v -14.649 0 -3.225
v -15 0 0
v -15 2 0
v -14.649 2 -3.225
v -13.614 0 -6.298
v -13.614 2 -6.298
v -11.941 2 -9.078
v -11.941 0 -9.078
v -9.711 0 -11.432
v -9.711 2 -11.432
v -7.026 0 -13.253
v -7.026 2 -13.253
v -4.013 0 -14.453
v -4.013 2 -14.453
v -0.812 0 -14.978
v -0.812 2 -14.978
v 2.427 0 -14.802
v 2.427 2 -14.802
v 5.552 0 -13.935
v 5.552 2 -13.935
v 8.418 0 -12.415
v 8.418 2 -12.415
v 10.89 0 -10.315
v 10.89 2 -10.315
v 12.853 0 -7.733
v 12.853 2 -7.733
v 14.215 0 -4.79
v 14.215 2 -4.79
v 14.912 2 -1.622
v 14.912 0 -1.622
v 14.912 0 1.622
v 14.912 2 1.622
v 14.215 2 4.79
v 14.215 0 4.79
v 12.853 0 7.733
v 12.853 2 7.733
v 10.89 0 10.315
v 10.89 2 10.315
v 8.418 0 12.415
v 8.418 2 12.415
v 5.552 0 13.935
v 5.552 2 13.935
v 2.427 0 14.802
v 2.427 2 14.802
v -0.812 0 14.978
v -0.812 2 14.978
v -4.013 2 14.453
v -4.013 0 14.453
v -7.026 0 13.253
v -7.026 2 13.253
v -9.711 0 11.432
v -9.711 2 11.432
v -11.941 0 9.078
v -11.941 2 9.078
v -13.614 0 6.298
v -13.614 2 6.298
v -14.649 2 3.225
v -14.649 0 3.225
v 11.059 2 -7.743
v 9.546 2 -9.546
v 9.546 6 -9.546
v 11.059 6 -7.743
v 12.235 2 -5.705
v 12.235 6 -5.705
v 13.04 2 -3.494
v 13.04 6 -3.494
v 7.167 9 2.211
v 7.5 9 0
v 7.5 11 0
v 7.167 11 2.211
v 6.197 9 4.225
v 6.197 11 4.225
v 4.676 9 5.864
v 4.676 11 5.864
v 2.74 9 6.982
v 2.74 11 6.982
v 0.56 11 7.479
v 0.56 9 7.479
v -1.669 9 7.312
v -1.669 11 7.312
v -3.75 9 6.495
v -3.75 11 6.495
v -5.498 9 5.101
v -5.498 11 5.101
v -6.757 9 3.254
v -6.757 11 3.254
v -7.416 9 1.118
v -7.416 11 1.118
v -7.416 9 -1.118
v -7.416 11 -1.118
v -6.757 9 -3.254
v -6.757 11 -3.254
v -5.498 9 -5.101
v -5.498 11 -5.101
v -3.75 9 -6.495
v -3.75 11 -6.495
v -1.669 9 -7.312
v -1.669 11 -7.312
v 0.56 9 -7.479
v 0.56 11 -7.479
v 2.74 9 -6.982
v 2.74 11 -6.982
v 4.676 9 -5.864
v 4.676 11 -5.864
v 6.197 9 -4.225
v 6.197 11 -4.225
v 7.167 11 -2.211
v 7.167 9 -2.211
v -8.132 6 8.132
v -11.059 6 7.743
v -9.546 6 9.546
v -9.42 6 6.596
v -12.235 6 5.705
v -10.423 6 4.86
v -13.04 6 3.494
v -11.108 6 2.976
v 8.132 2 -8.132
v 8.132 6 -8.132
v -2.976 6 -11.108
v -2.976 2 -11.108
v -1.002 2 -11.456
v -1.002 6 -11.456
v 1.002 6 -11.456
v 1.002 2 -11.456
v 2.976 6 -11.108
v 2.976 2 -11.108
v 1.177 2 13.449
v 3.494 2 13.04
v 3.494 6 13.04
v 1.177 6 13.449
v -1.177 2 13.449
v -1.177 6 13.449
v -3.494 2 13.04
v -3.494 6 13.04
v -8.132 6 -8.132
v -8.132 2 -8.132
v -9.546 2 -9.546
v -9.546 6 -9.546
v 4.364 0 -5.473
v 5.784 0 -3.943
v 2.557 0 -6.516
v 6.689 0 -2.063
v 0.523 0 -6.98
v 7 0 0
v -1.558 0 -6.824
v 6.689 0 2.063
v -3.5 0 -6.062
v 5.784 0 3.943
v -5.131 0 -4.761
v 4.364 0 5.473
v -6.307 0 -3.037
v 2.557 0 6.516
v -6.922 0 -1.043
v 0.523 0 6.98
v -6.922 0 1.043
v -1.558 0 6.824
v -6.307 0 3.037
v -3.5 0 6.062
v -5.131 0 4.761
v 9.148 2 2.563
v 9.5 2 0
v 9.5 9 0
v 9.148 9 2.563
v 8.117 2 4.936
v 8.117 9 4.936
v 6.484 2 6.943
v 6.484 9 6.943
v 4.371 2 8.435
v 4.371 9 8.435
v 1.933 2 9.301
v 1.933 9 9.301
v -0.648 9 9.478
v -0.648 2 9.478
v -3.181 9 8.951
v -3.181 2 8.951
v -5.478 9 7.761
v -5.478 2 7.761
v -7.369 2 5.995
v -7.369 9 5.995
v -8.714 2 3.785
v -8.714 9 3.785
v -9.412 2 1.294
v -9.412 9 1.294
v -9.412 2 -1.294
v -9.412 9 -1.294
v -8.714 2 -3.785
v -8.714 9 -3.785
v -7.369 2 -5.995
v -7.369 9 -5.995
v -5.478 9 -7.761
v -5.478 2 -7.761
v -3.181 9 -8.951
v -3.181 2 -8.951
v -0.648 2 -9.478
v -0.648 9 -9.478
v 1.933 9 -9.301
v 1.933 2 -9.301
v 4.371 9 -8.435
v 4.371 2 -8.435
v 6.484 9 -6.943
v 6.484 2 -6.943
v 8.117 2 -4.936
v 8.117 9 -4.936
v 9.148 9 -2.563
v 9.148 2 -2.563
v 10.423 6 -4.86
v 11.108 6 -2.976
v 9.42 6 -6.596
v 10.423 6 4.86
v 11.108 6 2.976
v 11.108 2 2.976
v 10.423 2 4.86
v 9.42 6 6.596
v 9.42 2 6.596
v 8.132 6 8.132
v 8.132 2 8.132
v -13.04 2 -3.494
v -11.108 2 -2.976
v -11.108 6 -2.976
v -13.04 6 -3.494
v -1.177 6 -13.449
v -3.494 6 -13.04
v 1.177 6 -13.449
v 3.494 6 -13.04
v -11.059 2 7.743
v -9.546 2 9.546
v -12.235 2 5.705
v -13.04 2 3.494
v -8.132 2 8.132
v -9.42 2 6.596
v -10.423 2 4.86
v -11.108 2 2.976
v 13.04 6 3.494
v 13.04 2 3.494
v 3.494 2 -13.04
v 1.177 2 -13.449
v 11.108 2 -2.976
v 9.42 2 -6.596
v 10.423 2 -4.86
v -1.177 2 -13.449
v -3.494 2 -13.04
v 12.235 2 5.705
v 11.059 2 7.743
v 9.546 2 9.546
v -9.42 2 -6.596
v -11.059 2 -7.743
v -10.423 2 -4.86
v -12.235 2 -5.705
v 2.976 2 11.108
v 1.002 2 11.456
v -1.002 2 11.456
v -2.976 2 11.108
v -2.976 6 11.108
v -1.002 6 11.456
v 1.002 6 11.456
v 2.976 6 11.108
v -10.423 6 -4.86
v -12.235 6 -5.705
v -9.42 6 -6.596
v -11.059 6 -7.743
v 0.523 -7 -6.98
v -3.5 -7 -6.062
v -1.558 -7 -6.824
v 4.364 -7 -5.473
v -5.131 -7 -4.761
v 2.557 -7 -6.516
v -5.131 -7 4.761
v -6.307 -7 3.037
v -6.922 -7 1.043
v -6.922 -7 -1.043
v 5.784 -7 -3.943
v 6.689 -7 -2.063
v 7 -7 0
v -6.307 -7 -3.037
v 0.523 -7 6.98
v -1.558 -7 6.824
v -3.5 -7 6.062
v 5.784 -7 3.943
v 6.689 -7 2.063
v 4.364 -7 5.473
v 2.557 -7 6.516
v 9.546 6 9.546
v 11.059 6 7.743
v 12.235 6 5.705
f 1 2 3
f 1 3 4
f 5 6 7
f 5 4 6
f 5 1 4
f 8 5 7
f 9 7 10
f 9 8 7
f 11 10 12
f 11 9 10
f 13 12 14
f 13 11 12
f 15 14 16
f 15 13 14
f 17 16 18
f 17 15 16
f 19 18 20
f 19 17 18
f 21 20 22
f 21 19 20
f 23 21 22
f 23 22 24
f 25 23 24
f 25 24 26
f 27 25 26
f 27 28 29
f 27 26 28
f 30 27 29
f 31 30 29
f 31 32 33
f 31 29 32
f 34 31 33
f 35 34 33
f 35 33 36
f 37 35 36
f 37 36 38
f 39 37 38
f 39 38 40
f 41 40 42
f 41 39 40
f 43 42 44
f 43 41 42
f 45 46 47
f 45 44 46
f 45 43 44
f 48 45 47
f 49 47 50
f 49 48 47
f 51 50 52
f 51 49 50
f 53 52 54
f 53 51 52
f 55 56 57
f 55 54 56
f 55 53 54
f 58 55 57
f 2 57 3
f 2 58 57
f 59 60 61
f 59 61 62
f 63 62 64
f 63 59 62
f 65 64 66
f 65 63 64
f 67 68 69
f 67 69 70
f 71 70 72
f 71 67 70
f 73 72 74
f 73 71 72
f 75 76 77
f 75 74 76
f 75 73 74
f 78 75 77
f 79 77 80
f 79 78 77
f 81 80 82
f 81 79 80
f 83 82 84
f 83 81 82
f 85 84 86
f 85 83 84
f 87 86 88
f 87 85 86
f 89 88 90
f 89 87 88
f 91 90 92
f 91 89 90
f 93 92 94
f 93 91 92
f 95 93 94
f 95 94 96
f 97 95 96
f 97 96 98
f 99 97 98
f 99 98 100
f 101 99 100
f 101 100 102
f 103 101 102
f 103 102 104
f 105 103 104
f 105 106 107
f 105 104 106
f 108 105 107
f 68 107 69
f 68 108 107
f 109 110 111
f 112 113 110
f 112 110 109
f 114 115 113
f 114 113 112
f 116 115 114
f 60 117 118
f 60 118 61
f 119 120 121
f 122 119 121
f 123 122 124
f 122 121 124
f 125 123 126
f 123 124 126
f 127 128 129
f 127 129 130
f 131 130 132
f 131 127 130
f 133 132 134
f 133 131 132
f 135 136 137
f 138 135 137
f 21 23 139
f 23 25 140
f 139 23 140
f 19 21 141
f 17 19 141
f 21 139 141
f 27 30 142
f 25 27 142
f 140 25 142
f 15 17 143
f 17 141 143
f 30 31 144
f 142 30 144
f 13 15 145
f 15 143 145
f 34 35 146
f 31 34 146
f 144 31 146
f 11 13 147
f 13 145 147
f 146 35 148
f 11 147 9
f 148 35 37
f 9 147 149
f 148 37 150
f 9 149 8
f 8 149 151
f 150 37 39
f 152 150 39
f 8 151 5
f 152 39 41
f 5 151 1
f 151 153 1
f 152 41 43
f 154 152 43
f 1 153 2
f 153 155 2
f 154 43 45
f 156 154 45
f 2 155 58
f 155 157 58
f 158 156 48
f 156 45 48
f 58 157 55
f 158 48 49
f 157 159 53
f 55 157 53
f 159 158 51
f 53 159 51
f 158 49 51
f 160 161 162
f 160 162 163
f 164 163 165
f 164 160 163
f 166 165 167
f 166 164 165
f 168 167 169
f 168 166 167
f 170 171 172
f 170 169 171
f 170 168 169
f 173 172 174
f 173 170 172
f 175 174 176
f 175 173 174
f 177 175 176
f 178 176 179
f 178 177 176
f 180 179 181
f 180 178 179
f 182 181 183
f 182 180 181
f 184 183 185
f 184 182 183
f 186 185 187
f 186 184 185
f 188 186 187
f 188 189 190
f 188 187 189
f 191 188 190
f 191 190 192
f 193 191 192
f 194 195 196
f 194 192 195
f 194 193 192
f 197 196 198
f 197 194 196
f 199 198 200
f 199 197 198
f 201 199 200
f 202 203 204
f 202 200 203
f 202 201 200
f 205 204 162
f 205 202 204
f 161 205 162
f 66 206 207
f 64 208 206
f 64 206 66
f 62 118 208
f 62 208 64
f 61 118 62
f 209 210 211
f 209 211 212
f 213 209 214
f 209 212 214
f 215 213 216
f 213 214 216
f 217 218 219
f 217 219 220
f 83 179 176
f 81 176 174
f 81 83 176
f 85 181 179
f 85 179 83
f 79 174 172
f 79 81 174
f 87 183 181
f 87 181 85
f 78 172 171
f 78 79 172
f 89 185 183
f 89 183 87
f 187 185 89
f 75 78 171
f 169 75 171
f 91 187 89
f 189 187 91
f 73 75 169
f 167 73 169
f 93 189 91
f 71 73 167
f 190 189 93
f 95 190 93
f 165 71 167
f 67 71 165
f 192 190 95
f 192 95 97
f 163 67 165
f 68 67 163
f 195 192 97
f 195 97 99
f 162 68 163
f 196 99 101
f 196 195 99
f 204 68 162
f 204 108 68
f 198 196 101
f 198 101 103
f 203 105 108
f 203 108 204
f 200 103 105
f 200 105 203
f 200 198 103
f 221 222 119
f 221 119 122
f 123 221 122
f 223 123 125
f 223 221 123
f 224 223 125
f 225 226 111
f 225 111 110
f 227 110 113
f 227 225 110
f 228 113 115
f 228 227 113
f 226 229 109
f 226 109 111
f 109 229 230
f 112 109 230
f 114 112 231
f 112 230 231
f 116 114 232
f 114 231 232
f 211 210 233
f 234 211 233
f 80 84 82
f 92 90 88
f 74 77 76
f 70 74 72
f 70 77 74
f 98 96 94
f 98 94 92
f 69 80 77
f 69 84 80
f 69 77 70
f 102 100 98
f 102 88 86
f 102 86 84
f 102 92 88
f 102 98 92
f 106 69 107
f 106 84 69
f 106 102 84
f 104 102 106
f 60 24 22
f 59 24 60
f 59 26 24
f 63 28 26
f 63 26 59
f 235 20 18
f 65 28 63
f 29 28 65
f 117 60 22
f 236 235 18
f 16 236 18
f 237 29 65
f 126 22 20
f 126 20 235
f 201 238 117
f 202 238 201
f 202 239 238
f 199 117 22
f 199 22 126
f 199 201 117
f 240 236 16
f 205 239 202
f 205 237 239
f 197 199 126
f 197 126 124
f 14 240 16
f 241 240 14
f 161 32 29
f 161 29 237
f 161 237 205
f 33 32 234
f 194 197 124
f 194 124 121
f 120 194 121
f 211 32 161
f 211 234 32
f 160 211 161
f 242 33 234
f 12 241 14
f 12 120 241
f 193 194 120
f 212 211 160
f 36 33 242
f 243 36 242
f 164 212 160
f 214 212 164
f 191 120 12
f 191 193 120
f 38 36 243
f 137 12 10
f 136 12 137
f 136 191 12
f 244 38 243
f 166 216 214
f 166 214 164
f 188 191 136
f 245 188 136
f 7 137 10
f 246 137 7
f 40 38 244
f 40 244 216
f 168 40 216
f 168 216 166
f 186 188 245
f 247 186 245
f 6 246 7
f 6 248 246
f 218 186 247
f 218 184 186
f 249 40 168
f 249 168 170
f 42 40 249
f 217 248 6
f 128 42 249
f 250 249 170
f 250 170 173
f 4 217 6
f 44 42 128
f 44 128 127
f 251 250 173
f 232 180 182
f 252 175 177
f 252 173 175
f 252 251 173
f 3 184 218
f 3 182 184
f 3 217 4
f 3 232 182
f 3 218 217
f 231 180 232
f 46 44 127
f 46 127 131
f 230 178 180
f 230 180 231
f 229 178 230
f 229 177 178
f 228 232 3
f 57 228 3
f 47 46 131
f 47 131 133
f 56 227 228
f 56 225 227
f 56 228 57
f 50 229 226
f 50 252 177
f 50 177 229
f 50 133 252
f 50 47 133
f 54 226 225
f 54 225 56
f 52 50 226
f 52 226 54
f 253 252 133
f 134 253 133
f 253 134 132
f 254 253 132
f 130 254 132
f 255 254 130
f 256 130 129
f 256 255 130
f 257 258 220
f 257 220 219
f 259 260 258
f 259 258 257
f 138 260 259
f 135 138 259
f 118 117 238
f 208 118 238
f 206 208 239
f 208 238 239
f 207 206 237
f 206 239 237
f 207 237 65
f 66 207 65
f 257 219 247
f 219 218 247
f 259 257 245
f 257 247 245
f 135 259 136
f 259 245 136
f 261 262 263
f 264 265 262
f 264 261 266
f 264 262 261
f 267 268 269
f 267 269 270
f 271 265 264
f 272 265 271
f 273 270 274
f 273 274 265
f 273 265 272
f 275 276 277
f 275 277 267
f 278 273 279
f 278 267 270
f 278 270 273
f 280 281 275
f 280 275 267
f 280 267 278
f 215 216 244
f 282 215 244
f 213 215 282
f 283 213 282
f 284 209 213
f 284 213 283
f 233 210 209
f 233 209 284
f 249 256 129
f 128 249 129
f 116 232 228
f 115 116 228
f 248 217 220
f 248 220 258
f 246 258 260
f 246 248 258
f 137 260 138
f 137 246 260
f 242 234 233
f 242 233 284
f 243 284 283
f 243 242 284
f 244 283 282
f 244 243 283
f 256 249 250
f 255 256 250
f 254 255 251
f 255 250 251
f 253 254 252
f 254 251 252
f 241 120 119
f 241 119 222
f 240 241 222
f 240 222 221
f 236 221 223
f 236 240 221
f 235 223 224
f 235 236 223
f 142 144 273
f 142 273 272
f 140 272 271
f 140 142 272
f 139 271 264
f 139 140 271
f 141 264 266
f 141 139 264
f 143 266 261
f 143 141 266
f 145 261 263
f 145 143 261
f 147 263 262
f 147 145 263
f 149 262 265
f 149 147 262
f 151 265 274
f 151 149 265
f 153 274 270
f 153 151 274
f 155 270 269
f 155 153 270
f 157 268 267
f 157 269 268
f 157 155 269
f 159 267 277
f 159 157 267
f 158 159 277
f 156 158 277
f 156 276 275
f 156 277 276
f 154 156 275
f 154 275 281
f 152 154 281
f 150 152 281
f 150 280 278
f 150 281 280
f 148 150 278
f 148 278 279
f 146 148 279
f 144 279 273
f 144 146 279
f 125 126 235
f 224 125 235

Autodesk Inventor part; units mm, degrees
ref_plane "YZ Plane" through (0, 0, 0) normal (1, 0, 0) x (0, 1, 0)
ref_plane "XZ Plane" through (0, 0, 0) normal (0, 1, 0) x (-1, 0, 0)
ref_plane "XY Plane" through (0, 0, 0) normal (0, 0, 1) x (1, 0, 0)
sketch "Sketch1" plane through (0, 0, 0) normal (0, 1, 0) x (-1, 0, 0)
  circle A0 centre (0, 0) radius 15
  dimension "d0" = 30
extrude "Extrusion1" add sketch "Sketch1" along normal blind 2
sketch "Sketch2" plane through (0, 2, 0) normal (0, 1, 0) x (1, 0, 0)
  circle A0 centre (0, 0) radius 15 projected
  circle A1 centre (0, 0) radius 13.5
  circle A2 centre (0, 0) radius 11.5
  line L0 (11.1081, 2.9764) -> (13.04, 3.4941)
  line L1 (0, 0) -> (13.5, 0) construction
  line L2 (11.1081, -2.9764) -> (13.04, -3.4941)
  line L3 (0, 0) -> (13.5, 0) construction
  line L4 (8.1317, 8.1317) -> (9.5459, 9.5459)
  line L5 (0, 0) -> (13.5, 0) construction
  line L6 (2.9764, 11.1081) -> (3.4941, 13.04)
  line L7 (0, 0) -> (13.5, 0) construction
  line L8 (-2.9764, 11.1081) -> (-3.4941, 13.04)
  circle A3 centre (0, 0) radius 15 projected
  line L9 (-8.1317, 8.1317) -> (-9.5459, 9.5459)
  line L10 (0, 0) -> (13.5, 0) construction
  line L11 (-9.5459, 9.5459) -> (-8.1317, 8.1317)
  line L12 (8.1317, -8.1317) -> (9.5459, -9.5459)
  line L13 (-3.4941, 13.04) -> (-2.9764, 11.1081)
  line L14 (2.9764, -11.1081) -> (3.4941, -13.04)
  line L15 (9.5459, 9.5459) -> (8.1317, 8.1317)
  line L16 (-8.1317, -8.1317) -> (-9.5459, -9.5459)
  line L17 (3.4941, 13.04) -> (2.9764, 11.1081)
  line L18 (-2.9764, -11.1081) -> (-3.4941, -13.04)
  line L19 (13.04, 3.4941) -> (11.1081, 2.9764)
  line L20 (-11.1081, -2.9764) -> (-13.04, -3.4941)
  line L21 (13.04, -3.4941) -> (11.1081, -2.9764)
  line L22 (-11.1081, 2.9764) -> (-13.04, 3.4941)
extrude "Extrusion2" add sketch "Sketch2" along normal blind 4 contours L0 A2 L4 A1 | A1 L12 A2 L2 | L6 A2 L8 A1 | A1 L18 A2 L14 | L9 A2 L22 A1 | A1 L20 A2 L16
sketch "Sketch3" plane through (0, 2, 0) normal (0, 1, 0) x (1, 0, 0)
  line L0 (-2.9764, 11.1081) -> (-3.4941, 13.04) projected
  arc A0 (3.4941, 13.04) -> (-3.4941, 13.04) centre (0, 0) ccw projected
  line L1 (3.4941, 13.04) -> (2.9764, 11.1081) projected
  arc A1 (2.9764, 11.1081) -> (-2.9764, 11.1081) centre (0, 0) ccw projected
  line L2 (-3.4941, -13.04) -> (-2.9764, -11.1081) projected
  arc A2 (-2.9764, -11.1081) -> (2.9764, -11.1081) centre (0, 0) ccw projected
  line L3 (2.9764, -11.1081) -> (3.4941, -13.04) projected
  arc A3 (-3.4941, -13.04) -> (3.4941, -13.04) centre (0, 0) ccw projected
  line L4 (-11.1081, 2.9764) -> (-13.04, 3.4941) projected
  arc A4 (-9.5459, 9.5459) -> (-13.04, 3.4941) centre (0, 0) ccw projected
  line L5 (-9.5459, 9.5459) -> (-8.1317, 8.1317) projected
  arc A5 (-8.1317, 8.1317) -> (-11.1081, 2.9764) centre (0, 0) ccw projected
  line L6 (8.1317, 8.1317) -> (9.5459, 9.5459) projected
  arc A6 (13.04, 3.4941) -> (9.5459, 9.5459) centre (0, 0) ccw projected
  line L7 (13.04, 3.4941) -> (11.1081, 2.9764) projected
  arc A7 (11.1081, 2.9764) -> (8.1317, 8.1317) centre (0, 0) ccw projected
  line L8 (9.5459, -9.5459) -> (8.1317, -8.1317) projected
  arc A8 (8.1317, -8.1317) -> (11.1081, -2.9764) centre (0, 0) ccw projected
  line L9 (11.1081, -2.9764) -> (13.04, -3.4941) projected
  arc A9 (9.5459, -9.5459) -> (13.04, -3.4941) centre (0, 0) ccw projected
  line L10 (-13.04, -3.4941) -> (-11.1081, -2.9764) projected
  arc A10 (-11.1081, -2.9764) -> (-8.1317, -8.1317) centre (0, 0) ccw projected
  line L11 (-8.1317, -8.1317) -> (-9.5459, -9.5459) projected
  arc A11 (-13.04, -3.4941) -> (-9.5459, -9.5459) centre (0, 0) ccw projected
  circle A12 centre (0, 0) radius 15 projected
  circle A13 centre (0, 0) radius 9.5
  dimension "d12" = 19
extrude "Extrusion3" add sketch "Sketch3" along normal blind 7 contours A13
sketch "Sketch4" plane through (0, 9, 0) normal (0, 1, 0) x (1, 0, 0)
  circle A0 centre (0, 0) radius 9.5 projected
  circle A1 centre (0, 0) radius 7.5
  dimension "d15" = 15
extrude "Extrusion4" add sketch "Sketch4" along normal blind 2 contours A1
sketch "Sketch5" plane through (0, 0, 0) normal (0, -1, 0) x (1, 0, 0)
  circle A0 centre (0, 0) radius 7
  dimension "d18" = 14
extrude "Extrusion5" add sketch "Sketch5" along normal blind 7
properties part number "Bisagra final"
